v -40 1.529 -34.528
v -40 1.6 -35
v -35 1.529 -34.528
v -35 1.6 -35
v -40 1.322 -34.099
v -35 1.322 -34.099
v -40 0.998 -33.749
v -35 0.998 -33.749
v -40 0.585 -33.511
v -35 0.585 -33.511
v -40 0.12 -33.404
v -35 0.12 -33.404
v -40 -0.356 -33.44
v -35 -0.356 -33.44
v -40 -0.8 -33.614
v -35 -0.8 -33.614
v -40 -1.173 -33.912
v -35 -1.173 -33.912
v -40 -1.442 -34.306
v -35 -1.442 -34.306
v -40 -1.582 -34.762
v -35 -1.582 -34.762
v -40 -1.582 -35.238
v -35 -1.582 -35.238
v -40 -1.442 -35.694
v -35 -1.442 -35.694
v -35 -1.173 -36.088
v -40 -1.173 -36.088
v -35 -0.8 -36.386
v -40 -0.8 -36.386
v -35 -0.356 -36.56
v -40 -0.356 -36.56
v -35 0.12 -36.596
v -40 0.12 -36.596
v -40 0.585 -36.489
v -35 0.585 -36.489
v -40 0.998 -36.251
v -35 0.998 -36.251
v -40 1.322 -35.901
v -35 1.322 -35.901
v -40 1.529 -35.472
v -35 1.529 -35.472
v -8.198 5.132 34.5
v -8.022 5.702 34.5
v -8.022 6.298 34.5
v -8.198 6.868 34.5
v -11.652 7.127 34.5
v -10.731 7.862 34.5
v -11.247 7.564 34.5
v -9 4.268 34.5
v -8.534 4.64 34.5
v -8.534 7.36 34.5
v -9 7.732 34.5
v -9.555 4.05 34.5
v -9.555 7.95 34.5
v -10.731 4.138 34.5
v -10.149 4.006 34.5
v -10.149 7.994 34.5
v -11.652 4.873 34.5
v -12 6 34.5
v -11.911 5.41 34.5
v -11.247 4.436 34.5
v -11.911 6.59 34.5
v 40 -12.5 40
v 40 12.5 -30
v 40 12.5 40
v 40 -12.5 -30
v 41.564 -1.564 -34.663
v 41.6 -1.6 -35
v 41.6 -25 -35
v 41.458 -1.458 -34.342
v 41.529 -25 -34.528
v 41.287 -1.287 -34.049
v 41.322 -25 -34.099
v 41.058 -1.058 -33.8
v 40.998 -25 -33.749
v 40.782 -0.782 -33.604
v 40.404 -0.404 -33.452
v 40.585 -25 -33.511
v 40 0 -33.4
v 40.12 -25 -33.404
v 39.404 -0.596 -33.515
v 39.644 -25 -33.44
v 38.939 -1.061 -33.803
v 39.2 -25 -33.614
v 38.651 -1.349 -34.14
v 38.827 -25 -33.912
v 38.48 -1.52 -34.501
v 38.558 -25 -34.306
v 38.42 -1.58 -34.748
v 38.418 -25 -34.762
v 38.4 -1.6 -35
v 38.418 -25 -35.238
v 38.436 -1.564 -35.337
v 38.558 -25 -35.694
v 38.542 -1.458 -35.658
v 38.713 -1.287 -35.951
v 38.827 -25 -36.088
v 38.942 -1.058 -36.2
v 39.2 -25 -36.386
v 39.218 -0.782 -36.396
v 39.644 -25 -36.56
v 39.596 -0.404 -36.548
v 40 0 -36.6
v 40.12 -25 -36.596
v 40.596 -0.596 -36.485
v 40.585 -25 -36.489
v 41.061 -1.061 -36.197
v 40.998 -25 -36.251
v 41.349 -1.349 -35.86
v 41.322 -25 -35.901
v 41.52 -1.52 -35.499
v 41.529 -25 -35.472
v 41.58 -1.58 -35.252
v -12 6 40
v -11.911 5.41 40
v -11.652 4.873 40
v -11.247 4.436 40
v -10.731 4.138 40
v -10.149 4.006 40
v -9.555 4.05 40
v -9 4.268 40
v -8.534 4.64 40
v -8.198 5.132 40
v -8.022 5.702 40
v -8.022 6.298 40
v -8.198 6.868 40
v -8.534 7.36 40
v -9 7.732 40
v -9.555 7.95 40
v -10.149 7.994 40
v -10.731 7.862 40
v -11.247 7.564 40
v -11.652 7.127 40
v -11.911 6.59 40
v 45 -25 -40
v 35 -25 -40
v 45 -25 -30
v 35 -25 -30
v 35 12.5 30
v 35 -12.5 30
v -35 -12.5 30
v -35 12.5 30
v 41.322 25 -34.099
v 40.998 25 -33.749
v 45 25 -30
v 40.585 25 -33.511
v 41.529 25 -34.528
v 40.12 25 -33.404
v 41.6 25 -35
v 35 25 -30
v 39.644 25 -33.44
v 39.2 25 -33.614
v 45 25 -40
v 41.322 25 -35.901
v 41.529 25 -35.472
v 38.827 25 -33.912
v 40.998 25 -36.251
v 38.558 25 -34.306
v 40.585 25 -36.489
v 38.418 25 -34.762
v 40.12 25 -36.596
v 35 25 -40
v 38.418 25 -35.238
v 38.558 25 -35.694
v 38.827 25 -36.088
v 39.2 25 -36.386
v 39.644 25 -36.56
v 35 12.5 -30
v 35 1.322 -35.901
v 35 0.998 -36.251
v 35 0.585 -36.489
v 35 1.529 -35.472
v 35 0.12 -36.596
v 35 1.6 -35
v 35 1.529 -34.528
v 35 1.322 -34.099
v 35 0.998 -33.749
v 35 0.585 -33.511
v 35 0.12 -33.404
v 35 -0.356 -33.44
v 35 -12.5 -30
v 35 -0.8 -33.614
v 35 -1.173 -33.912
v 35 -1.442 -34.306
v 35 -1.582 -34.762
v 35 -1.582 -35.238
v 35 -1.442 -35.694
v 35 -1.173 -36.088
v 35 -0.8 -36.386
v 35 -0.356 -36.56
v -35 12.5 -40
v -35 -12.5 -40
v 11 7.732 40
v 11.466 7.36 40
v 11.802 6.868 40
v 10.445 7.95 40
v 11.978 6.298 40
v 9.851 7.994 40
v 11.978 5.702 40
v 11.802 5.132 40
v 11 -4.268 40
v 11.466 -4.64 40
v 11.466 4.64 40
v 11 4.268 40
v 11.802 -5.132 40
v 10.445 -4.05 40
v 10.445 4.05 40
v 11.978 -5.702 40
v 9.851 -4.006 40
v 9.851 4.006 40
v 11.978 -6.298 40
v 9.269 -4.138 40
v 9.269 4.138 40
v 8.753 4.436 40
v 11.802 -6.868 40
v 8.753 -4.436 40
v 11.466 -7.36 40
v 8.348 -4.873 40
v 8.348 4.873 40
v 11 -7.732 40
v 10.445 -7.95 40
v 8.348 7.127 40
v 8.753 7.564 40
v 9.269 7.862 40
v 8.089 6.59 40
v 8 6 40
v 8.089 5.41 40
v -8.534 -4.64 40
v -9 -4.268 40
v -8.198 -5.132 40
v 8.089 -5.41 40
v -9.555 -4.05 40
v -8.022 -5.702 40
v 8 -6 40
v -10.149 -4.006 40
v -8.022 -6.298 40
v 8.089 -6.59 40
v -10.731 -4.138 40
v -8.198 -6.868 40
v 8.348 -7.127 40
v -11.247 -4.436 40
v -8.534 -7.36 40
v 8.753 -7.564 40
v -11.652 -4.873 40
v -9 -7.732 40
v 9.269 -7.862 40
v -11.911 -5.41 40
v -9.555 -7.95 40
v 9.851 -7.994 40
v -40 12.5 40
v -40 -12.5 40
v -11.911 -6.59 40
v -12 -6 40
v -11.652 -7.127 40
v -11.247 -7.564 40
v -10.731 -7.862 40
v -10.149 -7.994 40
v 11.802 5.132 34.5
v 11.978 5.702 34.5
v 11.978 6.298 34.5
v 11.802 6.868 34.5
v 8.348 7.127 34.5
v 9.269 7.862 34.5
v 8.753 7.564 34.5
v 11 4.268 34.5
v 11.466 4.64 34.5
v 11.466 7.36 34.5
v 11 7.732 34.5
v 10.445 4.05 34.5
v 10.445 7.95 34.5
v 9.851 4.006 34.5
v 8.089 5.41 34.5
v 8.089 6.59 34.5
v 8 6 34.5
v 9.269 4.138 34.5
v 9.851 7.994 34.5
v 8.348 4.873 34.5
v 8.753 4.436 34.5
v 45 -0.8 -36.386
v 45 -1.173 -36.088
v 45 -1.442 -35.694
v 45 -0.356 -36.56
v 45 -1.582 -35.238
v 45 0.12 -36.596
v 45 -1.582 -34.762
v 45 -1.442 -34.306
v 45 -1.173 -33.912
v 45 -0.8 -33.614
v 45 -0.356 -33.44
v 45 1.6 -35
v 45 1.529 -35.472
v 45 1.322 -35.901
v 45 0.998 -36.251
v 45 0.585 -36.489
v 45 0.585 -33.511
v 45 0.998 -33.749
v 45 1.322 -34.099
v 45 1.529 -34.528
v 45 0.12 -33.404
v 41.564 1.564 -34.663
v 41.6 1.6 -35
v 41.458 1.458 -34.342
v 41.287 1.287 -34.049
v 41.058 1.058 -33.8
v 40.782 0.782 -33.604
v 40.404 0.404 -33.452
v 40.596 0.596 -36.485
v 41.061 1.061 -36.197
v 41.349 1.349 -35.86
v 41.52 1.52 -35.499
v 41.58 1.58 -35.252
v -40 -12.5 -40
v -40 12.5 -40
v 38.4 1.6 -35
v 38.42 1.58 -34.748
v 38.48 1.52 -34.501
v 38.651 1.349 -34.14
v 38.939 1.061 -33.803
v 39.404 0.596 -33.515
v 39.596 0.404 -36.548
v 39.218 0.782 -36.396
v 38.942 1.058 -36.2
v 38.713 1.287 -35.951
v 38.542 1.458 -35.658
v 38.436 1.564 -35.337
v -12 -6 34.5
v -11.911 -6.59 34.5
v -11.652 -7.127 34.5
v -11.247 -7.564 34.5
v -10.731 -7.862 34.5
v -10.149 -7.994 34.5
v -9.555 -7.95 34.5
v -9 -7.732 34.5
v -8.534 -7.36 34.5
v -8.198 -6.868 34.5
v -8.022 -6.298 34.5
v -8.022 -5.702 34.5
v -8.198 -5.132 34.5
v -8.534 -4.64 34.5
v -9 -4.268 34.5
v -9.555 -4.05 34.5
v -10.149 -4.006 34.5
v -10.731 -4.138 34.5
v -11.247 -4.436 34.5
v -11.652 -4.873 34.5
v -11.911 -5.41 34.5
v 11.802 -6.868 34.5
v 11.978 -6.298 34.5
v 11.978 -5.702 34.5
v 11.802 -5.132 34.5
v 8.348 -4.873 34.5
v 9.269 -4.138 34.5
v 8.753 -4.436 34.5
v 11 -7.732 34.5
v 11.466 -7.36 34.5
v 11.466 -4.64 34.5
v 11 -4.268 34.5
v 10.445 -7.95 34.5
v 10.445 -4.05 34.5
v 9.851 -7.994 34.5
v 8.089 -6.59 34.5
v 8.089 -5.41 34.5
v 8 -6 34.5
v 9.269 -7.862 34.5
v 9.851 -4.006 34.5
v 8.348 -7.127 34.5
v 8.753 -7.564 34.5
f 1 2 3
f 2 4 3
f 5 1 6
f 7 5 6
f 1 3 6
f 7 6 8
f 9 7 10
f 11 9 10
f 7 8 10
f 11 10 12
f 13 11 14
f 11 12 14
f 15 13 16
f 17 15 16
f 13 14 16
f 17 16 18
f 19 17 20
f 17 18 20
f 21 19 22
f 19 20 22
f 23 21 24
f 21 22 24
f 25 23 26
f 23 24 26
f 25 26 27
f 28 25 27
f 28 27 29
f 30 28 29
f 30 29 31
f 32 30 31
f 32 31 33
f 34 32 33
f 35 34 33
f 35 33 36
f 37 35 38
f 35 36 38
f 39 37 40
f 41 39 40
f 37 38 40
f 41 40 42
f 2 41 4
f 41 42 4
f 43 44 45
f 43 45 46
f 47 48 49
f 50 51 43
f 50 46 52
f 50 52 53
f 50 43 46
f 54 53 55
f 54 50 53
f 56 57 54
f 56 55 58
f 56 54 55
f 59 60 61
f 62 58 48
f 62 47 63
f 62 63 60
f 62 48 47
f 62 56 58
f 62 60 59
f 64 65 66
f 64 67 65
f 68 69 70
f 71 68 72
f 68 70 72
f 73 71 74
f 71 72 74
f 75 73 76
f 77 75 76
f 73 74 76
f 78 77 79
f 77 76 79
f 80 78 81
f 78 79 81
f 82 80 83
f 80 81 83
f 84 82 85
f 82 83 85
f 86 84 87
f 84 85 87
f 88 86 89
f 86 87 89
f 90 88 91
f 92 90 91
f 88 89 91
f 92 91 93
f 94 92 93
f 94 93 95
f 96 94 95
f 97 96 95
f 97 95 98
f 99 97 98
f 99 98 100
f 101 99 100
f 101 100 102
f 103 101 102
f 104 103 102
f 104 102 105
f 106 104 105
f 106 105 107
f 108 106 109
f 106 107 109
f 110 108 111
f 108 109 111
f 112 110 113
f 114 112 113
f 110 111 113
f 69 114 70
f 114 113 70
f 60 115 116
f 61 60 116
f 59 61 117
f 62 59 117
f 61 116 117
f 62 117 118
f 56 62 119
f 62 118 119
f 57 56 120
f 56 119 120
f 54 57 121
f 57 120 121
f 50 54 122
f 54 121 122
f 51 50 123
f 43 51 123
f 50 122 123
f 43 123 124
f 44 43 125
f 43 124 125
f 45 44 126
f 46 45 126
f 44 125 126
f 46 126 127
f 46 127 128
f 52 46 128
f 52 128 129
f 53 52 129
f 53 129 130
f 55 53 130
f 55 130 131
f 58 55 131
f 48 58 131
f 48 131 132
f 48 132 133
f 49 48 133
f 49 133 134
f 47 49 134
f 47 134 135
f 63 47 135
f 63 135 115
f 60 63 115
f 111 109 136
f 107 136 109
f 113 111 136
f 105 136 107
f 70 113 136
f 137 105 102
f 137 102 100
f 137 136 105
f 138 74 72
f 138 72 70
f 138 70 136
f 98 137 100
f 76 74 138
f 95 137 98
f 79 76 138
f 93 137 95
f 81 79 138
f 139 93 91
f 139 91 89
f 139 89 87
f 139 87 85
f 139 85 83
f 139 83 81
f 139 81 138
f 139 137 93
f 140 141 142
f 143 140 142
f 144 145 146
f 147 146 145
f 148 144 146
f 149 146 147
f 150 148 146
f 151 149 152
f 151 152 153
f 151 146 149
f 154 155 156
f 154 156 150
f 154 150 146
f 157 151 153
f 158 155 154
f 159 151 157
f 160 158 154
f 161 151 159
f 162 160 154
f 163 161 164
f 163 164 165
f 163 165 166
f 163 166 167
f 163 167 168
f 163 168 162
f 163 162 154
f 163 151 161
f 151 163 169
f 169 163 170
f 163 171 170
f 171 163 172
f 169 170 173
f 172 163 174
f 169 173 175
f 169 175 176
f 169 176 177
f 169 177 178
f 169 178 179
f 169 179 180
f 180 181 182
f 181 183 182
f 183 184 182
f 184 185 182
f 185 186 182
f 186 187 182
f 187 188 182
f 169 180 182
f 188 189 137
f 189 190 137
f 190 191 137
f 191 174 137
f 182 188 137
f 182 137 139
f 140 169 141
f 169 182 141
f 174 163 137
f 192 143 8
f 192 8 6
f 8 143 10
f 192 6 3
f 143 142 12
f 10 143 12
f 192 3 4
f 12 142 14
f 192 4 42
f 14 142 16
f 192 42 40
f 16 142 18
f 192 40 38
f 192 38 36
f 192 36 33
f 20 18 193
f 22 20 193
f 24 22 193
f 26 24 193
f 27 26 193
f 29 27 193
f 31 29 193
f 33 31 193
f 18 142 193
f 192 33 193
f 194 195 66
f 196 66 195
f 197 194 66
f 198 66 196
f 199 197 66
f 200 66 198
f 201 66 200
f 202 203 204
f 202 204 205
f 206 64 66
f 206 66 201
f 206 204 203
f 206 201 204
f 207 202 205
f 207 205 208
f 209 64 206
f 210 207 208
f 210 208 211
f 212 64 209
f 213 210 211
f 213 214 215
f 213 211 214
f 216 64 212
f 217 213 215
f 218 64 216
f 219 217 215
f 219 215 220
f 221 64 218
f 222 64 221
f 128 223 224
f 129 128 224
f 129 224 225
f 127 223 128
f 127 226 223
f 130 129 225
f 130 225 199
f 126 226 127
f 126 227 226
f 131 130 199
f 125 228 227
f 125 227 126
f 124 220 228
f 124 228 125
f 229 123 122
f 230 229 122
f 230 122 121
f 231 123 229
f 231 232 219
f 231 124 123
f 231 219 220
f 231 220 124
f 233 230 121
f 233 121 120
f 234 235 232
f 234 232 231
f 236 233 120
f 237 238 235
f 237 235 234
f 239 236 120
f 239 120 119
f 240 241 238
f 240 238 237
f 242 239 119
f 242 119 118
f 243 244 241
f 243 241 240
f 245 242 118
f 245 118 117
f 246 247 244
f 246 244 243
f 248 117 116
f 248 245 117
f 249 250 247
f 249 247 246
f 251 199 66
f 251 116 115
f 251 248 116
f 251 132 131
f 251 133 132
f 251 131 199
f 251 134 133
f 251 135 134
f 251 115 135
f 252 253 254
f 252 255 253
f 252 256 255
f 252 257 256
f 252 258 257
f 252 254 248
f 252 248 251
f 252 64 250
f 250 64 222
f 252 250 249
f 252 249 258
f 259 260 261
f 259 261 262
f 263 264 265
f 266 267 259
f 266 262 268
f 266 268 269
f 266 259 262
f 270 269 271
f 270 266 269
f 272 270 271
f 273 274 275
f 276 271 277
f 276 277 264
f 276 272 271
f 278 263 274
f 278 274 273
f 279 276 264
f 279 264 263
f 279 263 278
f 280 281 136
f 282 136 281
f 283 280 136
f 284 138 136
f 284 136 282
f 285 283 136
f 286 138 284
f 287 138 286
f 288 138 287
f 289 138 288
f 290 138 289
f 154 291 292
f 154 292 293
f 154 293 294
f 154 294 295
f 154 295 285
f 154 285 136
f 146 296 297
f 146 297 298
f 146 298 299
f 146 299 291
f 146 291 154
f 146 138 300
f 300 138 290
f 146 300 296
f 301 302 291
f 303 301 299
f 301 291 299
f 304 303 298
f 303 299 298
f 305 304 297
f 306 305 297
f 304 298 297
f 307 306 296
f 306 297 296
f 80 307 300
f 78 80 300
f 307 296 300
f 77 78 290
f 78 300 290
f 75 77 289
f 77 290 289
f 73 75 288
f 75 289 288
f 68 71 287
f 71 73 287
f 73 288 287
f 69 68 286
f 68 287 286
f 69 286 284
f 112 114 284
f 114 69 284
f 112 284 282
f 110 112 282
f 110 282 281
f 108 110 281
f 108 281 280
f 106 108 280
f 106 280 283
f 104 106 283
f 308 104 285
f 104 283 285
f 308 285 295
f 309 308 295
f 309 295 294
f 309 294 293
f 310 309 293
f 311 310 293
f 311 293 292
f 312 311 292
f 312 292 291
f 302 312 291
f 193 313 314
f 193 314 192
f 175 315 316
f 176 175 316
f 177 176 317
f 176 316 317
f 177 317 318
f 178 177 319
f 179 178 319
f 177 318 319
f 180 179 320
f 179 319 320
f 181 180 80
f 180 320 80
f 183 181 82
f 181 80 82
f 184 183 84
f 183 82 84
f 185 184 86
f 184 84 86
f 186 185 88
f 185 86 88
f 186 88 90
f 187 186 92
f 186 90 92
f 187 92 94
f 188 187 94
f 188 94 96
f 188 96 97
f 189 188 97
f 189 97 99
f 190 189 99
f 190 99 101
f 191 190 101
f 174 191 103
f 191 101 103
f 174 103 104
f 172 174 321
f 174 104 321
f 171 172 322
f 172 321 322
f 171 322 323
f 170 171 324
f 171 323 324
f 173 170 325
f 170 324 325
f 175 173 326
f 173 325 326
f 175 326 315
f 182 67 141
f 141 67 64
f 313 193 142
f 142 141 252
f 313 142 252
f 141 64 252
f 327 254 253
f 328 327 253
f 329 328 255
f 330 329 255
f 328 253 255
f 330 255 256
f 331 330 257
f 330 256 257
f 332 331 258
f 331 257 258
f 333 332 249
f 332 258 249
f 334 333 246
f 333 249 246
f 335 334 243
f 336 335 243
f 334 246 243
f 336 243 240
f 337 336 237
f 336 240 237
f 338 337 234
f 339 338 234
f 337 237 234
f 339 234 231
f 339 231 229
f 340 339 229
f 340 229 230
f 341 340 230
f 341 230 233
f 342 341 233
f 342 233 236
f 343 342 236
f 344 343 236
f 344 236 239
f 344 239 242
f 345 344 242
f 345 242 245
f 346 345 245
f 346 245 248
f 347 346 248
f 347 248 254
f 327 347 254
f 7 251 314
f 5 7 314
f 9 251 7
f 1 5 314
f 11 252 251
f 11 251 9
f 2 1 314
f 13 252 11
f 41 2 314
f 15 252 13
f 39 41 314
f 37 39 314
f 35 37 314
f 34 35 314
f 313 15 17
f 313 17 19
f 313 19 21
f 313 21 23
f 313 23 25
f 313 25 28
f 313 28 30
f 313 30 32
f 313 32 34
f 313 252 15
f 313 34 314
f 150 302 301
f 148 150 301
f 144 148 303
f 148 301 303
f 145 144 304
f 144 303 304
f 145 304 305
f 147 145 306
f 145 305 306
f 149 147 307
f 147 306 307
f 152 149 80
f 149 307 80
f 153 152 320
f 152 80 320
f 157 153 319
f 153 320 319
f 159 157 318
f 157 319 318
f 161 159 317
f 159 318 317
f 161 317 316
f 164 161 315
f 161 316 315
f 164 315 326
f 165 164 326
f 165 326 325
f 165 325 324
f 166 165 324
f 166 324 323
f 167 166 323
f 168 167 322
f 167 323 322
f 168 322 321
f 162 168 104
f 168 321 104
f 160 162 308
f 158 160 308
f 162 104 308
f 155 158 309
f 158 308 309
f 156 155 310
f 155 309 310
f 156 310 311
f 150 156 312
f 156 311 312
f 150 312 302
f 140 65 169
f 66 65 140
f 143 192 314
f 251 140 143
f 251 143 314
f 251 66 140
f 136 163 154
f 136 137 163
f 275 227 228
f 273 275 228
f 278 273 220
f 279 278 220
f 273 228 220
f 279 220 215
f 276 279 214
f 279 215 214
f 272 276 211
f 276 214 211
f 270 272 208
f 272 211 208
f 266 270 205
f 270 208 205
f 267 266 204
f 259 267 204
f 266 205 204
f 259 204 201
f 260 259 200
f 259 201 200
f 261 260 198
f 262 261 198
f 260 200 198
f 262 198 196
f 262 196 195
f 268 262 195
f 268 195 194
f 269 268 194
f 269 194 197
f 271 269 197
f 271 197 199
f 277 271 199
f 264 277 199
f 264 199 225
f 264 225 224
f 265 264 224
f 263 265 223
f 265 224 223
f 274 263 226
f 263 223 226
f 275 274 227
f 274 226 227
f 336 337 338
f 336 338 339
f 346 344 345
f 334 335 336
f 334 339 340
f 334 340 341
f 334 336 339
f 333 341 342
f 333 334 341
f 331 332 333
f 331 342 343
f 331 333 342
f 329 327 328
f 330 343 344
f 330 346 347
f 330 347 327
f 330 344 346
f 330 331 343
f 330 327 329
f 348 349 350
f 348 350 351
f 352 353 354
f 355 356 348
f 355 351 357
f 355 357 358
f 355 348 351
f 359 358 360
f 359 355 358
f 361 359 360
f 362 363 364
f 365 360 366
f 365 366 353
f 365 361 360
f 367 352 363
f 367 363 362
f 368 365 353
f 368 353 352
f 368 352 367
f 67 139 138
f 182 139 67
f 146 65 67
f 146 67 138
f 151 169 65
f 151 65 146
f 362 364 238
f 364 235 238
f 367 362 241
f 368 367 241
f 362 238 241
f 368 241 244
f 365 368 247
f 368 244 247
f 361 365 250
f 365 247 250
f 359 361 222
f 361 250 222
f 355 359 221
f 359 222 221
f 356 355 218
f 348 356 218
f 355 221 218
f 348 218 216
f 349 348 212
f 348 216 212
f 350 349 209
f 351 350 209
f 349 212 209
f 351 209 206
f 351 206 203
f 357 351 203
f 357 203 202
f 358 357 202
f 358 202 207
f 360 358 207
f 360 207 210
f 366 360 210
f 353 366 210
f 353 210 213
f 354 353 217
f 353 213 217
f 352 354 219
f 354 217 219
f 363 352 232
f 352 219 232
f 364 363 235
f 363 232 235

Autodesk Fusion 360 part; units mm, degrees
sketch "Sketch3" plane through (0, 0, 0) normal (0, 1, 0) x (1, 0, 0)
  line L0 (40, -40) -> (-40, -40)
  line L1 (-40, -40) -> (-40, 40)
  line L2 (-40, 40) -> (40, 40)
  line L3 (40, 40) -> (40, -40)
  line L4 (40, -40) -> (-40, 40) construction
  line L5 (-40, -40) -> (40, 40) construction
  line L6 (35, 49.9978) -> (35, -35)
  line L7 (35, -35) -> (-35, -35)
  line L8 (-35, -35) -> (-35, 49.9995)
  dimension "d45" = 80
  dimension "d46" = 80
  dimension "d47" = 5
extrude "Extrude10" add sketch "Sketch3" along normal mid plane 25 contours L0 L1 L2 L3 L6 L7 L8
sketch "Sketch9" plane through (40, 0, 0) normal (1, 0, 0) x (0, 1, 0)
  line L0 (-12.5, -40) -> (12.5, -40)
  line L1 (12.5, -40) -> (12.5, 40)
  line L2 (12.5, 40) -> (-12.5, 40)
  line L3 (-12.5, 40) -> (-12.5, -40)
  line L4 (25, -40) -> (-25, -40)
  line L5 (-25, -40) -> (-25, -30)
  line L6 (-25, -30) -> (25, -30)
  line L7 (25, -30) -> (25, -40)
  line L8 (25, -40) -> (-25, -30) construction
  line L9 (-25, -40) -> (25, -30) construction
  line L10 (0, -30.1567) -> (0, 30.1567)
  point P0 (0, -35)
  dimension "d50" = 10
  dimension "d51" = 5
  dimension "d52" = 25
  dimension "d53" = 50
extrude "Extrude11" add sketch "Sketch9" along normal mid plane 10 contours L0 L1 L3 L4 L6 | L3 L4 L5 L6 | L1 L4 L6 L7
sketch "Sketch10" plane through (0, -25, 0) normal (0, -1, 0) x (1, 0, 0)
  line L0 (35, -40) -> (45, -40)
  line L1 (45, -40) -> (45, -30)
  line L2 (45, -30) -> (35, -30)
  line L3 (35, -30) -> (35, -40)
  line L4 (35, -40) -> (45, -30)
  line L5 (45, -40) -> (40, -35)
  circle A0 centre (40, -35) radius 1.6
  dimension "d56" = 3.2
extrude "Extrude12" cut sketch "Sketch10" against normal blind 64 contours L4 A0 | L4 L5 A0 | L4 L5 A0
sketch "Sketch11" plane through (45, 0, 0) normal (1, 0, 0) x (0, 1, 0)
  line L0 (25, -30) -> (-25, -30)
  line L1 (-25, -30) -> (-25, -40)
  line L2 (-25, -40) -> (25, -40)
  line L3 (25, -40) -> (25, -30)
  line L4 (-25, -40) -> (25, -30)
  line L5 (25, -40) -> (-25, -30)
  circle A0 centre (0, -35) radius 1.6
  dimension "d59" = 3.2
extrude "Extrude13" cut sketch "Sketch11" against normal blind 105 contours L4 L5 A0 | L4 L5 A0 | L4 L5 A0 | L4 L5 A0
extrude "Extrude14" add 1 faces at (11.6667, -4.1667, 35) along direction (0, 0, -1) blind 5
sketch "Sketch12" plane through (0, 0, 40) normal (0, 0, 1) x (-1, 0, 0)
  line L0 (-40, 12.5) -> (-40, -12.5)
  line L1 (-40, -12.5) -> (40, -12.5)
  line L2 (40, -12.5) -> (40, 12.5)
  line L3 (40, 12.5) -> (-40, 12.5)
  circle A0 centre (10, -6) radius 2
  circle A1 centre (-10, -6) radius 2
  circle A2 centre (10, 6) radius 2
  circle A3 centre (-10, 6) radius 2
  dimension "d68" = 4
  dimension "d69" = 10
  dimension "d70" = 6
  dimension "d73" = -20
  dimension "d74" = 12
extrude "Extrude15" cut sketch "Sketch12" against normal blind 5.5 contours A0 | A1 | A2 | A3
equation "d48 = ( 25 / 2 ) * 1 mm"
